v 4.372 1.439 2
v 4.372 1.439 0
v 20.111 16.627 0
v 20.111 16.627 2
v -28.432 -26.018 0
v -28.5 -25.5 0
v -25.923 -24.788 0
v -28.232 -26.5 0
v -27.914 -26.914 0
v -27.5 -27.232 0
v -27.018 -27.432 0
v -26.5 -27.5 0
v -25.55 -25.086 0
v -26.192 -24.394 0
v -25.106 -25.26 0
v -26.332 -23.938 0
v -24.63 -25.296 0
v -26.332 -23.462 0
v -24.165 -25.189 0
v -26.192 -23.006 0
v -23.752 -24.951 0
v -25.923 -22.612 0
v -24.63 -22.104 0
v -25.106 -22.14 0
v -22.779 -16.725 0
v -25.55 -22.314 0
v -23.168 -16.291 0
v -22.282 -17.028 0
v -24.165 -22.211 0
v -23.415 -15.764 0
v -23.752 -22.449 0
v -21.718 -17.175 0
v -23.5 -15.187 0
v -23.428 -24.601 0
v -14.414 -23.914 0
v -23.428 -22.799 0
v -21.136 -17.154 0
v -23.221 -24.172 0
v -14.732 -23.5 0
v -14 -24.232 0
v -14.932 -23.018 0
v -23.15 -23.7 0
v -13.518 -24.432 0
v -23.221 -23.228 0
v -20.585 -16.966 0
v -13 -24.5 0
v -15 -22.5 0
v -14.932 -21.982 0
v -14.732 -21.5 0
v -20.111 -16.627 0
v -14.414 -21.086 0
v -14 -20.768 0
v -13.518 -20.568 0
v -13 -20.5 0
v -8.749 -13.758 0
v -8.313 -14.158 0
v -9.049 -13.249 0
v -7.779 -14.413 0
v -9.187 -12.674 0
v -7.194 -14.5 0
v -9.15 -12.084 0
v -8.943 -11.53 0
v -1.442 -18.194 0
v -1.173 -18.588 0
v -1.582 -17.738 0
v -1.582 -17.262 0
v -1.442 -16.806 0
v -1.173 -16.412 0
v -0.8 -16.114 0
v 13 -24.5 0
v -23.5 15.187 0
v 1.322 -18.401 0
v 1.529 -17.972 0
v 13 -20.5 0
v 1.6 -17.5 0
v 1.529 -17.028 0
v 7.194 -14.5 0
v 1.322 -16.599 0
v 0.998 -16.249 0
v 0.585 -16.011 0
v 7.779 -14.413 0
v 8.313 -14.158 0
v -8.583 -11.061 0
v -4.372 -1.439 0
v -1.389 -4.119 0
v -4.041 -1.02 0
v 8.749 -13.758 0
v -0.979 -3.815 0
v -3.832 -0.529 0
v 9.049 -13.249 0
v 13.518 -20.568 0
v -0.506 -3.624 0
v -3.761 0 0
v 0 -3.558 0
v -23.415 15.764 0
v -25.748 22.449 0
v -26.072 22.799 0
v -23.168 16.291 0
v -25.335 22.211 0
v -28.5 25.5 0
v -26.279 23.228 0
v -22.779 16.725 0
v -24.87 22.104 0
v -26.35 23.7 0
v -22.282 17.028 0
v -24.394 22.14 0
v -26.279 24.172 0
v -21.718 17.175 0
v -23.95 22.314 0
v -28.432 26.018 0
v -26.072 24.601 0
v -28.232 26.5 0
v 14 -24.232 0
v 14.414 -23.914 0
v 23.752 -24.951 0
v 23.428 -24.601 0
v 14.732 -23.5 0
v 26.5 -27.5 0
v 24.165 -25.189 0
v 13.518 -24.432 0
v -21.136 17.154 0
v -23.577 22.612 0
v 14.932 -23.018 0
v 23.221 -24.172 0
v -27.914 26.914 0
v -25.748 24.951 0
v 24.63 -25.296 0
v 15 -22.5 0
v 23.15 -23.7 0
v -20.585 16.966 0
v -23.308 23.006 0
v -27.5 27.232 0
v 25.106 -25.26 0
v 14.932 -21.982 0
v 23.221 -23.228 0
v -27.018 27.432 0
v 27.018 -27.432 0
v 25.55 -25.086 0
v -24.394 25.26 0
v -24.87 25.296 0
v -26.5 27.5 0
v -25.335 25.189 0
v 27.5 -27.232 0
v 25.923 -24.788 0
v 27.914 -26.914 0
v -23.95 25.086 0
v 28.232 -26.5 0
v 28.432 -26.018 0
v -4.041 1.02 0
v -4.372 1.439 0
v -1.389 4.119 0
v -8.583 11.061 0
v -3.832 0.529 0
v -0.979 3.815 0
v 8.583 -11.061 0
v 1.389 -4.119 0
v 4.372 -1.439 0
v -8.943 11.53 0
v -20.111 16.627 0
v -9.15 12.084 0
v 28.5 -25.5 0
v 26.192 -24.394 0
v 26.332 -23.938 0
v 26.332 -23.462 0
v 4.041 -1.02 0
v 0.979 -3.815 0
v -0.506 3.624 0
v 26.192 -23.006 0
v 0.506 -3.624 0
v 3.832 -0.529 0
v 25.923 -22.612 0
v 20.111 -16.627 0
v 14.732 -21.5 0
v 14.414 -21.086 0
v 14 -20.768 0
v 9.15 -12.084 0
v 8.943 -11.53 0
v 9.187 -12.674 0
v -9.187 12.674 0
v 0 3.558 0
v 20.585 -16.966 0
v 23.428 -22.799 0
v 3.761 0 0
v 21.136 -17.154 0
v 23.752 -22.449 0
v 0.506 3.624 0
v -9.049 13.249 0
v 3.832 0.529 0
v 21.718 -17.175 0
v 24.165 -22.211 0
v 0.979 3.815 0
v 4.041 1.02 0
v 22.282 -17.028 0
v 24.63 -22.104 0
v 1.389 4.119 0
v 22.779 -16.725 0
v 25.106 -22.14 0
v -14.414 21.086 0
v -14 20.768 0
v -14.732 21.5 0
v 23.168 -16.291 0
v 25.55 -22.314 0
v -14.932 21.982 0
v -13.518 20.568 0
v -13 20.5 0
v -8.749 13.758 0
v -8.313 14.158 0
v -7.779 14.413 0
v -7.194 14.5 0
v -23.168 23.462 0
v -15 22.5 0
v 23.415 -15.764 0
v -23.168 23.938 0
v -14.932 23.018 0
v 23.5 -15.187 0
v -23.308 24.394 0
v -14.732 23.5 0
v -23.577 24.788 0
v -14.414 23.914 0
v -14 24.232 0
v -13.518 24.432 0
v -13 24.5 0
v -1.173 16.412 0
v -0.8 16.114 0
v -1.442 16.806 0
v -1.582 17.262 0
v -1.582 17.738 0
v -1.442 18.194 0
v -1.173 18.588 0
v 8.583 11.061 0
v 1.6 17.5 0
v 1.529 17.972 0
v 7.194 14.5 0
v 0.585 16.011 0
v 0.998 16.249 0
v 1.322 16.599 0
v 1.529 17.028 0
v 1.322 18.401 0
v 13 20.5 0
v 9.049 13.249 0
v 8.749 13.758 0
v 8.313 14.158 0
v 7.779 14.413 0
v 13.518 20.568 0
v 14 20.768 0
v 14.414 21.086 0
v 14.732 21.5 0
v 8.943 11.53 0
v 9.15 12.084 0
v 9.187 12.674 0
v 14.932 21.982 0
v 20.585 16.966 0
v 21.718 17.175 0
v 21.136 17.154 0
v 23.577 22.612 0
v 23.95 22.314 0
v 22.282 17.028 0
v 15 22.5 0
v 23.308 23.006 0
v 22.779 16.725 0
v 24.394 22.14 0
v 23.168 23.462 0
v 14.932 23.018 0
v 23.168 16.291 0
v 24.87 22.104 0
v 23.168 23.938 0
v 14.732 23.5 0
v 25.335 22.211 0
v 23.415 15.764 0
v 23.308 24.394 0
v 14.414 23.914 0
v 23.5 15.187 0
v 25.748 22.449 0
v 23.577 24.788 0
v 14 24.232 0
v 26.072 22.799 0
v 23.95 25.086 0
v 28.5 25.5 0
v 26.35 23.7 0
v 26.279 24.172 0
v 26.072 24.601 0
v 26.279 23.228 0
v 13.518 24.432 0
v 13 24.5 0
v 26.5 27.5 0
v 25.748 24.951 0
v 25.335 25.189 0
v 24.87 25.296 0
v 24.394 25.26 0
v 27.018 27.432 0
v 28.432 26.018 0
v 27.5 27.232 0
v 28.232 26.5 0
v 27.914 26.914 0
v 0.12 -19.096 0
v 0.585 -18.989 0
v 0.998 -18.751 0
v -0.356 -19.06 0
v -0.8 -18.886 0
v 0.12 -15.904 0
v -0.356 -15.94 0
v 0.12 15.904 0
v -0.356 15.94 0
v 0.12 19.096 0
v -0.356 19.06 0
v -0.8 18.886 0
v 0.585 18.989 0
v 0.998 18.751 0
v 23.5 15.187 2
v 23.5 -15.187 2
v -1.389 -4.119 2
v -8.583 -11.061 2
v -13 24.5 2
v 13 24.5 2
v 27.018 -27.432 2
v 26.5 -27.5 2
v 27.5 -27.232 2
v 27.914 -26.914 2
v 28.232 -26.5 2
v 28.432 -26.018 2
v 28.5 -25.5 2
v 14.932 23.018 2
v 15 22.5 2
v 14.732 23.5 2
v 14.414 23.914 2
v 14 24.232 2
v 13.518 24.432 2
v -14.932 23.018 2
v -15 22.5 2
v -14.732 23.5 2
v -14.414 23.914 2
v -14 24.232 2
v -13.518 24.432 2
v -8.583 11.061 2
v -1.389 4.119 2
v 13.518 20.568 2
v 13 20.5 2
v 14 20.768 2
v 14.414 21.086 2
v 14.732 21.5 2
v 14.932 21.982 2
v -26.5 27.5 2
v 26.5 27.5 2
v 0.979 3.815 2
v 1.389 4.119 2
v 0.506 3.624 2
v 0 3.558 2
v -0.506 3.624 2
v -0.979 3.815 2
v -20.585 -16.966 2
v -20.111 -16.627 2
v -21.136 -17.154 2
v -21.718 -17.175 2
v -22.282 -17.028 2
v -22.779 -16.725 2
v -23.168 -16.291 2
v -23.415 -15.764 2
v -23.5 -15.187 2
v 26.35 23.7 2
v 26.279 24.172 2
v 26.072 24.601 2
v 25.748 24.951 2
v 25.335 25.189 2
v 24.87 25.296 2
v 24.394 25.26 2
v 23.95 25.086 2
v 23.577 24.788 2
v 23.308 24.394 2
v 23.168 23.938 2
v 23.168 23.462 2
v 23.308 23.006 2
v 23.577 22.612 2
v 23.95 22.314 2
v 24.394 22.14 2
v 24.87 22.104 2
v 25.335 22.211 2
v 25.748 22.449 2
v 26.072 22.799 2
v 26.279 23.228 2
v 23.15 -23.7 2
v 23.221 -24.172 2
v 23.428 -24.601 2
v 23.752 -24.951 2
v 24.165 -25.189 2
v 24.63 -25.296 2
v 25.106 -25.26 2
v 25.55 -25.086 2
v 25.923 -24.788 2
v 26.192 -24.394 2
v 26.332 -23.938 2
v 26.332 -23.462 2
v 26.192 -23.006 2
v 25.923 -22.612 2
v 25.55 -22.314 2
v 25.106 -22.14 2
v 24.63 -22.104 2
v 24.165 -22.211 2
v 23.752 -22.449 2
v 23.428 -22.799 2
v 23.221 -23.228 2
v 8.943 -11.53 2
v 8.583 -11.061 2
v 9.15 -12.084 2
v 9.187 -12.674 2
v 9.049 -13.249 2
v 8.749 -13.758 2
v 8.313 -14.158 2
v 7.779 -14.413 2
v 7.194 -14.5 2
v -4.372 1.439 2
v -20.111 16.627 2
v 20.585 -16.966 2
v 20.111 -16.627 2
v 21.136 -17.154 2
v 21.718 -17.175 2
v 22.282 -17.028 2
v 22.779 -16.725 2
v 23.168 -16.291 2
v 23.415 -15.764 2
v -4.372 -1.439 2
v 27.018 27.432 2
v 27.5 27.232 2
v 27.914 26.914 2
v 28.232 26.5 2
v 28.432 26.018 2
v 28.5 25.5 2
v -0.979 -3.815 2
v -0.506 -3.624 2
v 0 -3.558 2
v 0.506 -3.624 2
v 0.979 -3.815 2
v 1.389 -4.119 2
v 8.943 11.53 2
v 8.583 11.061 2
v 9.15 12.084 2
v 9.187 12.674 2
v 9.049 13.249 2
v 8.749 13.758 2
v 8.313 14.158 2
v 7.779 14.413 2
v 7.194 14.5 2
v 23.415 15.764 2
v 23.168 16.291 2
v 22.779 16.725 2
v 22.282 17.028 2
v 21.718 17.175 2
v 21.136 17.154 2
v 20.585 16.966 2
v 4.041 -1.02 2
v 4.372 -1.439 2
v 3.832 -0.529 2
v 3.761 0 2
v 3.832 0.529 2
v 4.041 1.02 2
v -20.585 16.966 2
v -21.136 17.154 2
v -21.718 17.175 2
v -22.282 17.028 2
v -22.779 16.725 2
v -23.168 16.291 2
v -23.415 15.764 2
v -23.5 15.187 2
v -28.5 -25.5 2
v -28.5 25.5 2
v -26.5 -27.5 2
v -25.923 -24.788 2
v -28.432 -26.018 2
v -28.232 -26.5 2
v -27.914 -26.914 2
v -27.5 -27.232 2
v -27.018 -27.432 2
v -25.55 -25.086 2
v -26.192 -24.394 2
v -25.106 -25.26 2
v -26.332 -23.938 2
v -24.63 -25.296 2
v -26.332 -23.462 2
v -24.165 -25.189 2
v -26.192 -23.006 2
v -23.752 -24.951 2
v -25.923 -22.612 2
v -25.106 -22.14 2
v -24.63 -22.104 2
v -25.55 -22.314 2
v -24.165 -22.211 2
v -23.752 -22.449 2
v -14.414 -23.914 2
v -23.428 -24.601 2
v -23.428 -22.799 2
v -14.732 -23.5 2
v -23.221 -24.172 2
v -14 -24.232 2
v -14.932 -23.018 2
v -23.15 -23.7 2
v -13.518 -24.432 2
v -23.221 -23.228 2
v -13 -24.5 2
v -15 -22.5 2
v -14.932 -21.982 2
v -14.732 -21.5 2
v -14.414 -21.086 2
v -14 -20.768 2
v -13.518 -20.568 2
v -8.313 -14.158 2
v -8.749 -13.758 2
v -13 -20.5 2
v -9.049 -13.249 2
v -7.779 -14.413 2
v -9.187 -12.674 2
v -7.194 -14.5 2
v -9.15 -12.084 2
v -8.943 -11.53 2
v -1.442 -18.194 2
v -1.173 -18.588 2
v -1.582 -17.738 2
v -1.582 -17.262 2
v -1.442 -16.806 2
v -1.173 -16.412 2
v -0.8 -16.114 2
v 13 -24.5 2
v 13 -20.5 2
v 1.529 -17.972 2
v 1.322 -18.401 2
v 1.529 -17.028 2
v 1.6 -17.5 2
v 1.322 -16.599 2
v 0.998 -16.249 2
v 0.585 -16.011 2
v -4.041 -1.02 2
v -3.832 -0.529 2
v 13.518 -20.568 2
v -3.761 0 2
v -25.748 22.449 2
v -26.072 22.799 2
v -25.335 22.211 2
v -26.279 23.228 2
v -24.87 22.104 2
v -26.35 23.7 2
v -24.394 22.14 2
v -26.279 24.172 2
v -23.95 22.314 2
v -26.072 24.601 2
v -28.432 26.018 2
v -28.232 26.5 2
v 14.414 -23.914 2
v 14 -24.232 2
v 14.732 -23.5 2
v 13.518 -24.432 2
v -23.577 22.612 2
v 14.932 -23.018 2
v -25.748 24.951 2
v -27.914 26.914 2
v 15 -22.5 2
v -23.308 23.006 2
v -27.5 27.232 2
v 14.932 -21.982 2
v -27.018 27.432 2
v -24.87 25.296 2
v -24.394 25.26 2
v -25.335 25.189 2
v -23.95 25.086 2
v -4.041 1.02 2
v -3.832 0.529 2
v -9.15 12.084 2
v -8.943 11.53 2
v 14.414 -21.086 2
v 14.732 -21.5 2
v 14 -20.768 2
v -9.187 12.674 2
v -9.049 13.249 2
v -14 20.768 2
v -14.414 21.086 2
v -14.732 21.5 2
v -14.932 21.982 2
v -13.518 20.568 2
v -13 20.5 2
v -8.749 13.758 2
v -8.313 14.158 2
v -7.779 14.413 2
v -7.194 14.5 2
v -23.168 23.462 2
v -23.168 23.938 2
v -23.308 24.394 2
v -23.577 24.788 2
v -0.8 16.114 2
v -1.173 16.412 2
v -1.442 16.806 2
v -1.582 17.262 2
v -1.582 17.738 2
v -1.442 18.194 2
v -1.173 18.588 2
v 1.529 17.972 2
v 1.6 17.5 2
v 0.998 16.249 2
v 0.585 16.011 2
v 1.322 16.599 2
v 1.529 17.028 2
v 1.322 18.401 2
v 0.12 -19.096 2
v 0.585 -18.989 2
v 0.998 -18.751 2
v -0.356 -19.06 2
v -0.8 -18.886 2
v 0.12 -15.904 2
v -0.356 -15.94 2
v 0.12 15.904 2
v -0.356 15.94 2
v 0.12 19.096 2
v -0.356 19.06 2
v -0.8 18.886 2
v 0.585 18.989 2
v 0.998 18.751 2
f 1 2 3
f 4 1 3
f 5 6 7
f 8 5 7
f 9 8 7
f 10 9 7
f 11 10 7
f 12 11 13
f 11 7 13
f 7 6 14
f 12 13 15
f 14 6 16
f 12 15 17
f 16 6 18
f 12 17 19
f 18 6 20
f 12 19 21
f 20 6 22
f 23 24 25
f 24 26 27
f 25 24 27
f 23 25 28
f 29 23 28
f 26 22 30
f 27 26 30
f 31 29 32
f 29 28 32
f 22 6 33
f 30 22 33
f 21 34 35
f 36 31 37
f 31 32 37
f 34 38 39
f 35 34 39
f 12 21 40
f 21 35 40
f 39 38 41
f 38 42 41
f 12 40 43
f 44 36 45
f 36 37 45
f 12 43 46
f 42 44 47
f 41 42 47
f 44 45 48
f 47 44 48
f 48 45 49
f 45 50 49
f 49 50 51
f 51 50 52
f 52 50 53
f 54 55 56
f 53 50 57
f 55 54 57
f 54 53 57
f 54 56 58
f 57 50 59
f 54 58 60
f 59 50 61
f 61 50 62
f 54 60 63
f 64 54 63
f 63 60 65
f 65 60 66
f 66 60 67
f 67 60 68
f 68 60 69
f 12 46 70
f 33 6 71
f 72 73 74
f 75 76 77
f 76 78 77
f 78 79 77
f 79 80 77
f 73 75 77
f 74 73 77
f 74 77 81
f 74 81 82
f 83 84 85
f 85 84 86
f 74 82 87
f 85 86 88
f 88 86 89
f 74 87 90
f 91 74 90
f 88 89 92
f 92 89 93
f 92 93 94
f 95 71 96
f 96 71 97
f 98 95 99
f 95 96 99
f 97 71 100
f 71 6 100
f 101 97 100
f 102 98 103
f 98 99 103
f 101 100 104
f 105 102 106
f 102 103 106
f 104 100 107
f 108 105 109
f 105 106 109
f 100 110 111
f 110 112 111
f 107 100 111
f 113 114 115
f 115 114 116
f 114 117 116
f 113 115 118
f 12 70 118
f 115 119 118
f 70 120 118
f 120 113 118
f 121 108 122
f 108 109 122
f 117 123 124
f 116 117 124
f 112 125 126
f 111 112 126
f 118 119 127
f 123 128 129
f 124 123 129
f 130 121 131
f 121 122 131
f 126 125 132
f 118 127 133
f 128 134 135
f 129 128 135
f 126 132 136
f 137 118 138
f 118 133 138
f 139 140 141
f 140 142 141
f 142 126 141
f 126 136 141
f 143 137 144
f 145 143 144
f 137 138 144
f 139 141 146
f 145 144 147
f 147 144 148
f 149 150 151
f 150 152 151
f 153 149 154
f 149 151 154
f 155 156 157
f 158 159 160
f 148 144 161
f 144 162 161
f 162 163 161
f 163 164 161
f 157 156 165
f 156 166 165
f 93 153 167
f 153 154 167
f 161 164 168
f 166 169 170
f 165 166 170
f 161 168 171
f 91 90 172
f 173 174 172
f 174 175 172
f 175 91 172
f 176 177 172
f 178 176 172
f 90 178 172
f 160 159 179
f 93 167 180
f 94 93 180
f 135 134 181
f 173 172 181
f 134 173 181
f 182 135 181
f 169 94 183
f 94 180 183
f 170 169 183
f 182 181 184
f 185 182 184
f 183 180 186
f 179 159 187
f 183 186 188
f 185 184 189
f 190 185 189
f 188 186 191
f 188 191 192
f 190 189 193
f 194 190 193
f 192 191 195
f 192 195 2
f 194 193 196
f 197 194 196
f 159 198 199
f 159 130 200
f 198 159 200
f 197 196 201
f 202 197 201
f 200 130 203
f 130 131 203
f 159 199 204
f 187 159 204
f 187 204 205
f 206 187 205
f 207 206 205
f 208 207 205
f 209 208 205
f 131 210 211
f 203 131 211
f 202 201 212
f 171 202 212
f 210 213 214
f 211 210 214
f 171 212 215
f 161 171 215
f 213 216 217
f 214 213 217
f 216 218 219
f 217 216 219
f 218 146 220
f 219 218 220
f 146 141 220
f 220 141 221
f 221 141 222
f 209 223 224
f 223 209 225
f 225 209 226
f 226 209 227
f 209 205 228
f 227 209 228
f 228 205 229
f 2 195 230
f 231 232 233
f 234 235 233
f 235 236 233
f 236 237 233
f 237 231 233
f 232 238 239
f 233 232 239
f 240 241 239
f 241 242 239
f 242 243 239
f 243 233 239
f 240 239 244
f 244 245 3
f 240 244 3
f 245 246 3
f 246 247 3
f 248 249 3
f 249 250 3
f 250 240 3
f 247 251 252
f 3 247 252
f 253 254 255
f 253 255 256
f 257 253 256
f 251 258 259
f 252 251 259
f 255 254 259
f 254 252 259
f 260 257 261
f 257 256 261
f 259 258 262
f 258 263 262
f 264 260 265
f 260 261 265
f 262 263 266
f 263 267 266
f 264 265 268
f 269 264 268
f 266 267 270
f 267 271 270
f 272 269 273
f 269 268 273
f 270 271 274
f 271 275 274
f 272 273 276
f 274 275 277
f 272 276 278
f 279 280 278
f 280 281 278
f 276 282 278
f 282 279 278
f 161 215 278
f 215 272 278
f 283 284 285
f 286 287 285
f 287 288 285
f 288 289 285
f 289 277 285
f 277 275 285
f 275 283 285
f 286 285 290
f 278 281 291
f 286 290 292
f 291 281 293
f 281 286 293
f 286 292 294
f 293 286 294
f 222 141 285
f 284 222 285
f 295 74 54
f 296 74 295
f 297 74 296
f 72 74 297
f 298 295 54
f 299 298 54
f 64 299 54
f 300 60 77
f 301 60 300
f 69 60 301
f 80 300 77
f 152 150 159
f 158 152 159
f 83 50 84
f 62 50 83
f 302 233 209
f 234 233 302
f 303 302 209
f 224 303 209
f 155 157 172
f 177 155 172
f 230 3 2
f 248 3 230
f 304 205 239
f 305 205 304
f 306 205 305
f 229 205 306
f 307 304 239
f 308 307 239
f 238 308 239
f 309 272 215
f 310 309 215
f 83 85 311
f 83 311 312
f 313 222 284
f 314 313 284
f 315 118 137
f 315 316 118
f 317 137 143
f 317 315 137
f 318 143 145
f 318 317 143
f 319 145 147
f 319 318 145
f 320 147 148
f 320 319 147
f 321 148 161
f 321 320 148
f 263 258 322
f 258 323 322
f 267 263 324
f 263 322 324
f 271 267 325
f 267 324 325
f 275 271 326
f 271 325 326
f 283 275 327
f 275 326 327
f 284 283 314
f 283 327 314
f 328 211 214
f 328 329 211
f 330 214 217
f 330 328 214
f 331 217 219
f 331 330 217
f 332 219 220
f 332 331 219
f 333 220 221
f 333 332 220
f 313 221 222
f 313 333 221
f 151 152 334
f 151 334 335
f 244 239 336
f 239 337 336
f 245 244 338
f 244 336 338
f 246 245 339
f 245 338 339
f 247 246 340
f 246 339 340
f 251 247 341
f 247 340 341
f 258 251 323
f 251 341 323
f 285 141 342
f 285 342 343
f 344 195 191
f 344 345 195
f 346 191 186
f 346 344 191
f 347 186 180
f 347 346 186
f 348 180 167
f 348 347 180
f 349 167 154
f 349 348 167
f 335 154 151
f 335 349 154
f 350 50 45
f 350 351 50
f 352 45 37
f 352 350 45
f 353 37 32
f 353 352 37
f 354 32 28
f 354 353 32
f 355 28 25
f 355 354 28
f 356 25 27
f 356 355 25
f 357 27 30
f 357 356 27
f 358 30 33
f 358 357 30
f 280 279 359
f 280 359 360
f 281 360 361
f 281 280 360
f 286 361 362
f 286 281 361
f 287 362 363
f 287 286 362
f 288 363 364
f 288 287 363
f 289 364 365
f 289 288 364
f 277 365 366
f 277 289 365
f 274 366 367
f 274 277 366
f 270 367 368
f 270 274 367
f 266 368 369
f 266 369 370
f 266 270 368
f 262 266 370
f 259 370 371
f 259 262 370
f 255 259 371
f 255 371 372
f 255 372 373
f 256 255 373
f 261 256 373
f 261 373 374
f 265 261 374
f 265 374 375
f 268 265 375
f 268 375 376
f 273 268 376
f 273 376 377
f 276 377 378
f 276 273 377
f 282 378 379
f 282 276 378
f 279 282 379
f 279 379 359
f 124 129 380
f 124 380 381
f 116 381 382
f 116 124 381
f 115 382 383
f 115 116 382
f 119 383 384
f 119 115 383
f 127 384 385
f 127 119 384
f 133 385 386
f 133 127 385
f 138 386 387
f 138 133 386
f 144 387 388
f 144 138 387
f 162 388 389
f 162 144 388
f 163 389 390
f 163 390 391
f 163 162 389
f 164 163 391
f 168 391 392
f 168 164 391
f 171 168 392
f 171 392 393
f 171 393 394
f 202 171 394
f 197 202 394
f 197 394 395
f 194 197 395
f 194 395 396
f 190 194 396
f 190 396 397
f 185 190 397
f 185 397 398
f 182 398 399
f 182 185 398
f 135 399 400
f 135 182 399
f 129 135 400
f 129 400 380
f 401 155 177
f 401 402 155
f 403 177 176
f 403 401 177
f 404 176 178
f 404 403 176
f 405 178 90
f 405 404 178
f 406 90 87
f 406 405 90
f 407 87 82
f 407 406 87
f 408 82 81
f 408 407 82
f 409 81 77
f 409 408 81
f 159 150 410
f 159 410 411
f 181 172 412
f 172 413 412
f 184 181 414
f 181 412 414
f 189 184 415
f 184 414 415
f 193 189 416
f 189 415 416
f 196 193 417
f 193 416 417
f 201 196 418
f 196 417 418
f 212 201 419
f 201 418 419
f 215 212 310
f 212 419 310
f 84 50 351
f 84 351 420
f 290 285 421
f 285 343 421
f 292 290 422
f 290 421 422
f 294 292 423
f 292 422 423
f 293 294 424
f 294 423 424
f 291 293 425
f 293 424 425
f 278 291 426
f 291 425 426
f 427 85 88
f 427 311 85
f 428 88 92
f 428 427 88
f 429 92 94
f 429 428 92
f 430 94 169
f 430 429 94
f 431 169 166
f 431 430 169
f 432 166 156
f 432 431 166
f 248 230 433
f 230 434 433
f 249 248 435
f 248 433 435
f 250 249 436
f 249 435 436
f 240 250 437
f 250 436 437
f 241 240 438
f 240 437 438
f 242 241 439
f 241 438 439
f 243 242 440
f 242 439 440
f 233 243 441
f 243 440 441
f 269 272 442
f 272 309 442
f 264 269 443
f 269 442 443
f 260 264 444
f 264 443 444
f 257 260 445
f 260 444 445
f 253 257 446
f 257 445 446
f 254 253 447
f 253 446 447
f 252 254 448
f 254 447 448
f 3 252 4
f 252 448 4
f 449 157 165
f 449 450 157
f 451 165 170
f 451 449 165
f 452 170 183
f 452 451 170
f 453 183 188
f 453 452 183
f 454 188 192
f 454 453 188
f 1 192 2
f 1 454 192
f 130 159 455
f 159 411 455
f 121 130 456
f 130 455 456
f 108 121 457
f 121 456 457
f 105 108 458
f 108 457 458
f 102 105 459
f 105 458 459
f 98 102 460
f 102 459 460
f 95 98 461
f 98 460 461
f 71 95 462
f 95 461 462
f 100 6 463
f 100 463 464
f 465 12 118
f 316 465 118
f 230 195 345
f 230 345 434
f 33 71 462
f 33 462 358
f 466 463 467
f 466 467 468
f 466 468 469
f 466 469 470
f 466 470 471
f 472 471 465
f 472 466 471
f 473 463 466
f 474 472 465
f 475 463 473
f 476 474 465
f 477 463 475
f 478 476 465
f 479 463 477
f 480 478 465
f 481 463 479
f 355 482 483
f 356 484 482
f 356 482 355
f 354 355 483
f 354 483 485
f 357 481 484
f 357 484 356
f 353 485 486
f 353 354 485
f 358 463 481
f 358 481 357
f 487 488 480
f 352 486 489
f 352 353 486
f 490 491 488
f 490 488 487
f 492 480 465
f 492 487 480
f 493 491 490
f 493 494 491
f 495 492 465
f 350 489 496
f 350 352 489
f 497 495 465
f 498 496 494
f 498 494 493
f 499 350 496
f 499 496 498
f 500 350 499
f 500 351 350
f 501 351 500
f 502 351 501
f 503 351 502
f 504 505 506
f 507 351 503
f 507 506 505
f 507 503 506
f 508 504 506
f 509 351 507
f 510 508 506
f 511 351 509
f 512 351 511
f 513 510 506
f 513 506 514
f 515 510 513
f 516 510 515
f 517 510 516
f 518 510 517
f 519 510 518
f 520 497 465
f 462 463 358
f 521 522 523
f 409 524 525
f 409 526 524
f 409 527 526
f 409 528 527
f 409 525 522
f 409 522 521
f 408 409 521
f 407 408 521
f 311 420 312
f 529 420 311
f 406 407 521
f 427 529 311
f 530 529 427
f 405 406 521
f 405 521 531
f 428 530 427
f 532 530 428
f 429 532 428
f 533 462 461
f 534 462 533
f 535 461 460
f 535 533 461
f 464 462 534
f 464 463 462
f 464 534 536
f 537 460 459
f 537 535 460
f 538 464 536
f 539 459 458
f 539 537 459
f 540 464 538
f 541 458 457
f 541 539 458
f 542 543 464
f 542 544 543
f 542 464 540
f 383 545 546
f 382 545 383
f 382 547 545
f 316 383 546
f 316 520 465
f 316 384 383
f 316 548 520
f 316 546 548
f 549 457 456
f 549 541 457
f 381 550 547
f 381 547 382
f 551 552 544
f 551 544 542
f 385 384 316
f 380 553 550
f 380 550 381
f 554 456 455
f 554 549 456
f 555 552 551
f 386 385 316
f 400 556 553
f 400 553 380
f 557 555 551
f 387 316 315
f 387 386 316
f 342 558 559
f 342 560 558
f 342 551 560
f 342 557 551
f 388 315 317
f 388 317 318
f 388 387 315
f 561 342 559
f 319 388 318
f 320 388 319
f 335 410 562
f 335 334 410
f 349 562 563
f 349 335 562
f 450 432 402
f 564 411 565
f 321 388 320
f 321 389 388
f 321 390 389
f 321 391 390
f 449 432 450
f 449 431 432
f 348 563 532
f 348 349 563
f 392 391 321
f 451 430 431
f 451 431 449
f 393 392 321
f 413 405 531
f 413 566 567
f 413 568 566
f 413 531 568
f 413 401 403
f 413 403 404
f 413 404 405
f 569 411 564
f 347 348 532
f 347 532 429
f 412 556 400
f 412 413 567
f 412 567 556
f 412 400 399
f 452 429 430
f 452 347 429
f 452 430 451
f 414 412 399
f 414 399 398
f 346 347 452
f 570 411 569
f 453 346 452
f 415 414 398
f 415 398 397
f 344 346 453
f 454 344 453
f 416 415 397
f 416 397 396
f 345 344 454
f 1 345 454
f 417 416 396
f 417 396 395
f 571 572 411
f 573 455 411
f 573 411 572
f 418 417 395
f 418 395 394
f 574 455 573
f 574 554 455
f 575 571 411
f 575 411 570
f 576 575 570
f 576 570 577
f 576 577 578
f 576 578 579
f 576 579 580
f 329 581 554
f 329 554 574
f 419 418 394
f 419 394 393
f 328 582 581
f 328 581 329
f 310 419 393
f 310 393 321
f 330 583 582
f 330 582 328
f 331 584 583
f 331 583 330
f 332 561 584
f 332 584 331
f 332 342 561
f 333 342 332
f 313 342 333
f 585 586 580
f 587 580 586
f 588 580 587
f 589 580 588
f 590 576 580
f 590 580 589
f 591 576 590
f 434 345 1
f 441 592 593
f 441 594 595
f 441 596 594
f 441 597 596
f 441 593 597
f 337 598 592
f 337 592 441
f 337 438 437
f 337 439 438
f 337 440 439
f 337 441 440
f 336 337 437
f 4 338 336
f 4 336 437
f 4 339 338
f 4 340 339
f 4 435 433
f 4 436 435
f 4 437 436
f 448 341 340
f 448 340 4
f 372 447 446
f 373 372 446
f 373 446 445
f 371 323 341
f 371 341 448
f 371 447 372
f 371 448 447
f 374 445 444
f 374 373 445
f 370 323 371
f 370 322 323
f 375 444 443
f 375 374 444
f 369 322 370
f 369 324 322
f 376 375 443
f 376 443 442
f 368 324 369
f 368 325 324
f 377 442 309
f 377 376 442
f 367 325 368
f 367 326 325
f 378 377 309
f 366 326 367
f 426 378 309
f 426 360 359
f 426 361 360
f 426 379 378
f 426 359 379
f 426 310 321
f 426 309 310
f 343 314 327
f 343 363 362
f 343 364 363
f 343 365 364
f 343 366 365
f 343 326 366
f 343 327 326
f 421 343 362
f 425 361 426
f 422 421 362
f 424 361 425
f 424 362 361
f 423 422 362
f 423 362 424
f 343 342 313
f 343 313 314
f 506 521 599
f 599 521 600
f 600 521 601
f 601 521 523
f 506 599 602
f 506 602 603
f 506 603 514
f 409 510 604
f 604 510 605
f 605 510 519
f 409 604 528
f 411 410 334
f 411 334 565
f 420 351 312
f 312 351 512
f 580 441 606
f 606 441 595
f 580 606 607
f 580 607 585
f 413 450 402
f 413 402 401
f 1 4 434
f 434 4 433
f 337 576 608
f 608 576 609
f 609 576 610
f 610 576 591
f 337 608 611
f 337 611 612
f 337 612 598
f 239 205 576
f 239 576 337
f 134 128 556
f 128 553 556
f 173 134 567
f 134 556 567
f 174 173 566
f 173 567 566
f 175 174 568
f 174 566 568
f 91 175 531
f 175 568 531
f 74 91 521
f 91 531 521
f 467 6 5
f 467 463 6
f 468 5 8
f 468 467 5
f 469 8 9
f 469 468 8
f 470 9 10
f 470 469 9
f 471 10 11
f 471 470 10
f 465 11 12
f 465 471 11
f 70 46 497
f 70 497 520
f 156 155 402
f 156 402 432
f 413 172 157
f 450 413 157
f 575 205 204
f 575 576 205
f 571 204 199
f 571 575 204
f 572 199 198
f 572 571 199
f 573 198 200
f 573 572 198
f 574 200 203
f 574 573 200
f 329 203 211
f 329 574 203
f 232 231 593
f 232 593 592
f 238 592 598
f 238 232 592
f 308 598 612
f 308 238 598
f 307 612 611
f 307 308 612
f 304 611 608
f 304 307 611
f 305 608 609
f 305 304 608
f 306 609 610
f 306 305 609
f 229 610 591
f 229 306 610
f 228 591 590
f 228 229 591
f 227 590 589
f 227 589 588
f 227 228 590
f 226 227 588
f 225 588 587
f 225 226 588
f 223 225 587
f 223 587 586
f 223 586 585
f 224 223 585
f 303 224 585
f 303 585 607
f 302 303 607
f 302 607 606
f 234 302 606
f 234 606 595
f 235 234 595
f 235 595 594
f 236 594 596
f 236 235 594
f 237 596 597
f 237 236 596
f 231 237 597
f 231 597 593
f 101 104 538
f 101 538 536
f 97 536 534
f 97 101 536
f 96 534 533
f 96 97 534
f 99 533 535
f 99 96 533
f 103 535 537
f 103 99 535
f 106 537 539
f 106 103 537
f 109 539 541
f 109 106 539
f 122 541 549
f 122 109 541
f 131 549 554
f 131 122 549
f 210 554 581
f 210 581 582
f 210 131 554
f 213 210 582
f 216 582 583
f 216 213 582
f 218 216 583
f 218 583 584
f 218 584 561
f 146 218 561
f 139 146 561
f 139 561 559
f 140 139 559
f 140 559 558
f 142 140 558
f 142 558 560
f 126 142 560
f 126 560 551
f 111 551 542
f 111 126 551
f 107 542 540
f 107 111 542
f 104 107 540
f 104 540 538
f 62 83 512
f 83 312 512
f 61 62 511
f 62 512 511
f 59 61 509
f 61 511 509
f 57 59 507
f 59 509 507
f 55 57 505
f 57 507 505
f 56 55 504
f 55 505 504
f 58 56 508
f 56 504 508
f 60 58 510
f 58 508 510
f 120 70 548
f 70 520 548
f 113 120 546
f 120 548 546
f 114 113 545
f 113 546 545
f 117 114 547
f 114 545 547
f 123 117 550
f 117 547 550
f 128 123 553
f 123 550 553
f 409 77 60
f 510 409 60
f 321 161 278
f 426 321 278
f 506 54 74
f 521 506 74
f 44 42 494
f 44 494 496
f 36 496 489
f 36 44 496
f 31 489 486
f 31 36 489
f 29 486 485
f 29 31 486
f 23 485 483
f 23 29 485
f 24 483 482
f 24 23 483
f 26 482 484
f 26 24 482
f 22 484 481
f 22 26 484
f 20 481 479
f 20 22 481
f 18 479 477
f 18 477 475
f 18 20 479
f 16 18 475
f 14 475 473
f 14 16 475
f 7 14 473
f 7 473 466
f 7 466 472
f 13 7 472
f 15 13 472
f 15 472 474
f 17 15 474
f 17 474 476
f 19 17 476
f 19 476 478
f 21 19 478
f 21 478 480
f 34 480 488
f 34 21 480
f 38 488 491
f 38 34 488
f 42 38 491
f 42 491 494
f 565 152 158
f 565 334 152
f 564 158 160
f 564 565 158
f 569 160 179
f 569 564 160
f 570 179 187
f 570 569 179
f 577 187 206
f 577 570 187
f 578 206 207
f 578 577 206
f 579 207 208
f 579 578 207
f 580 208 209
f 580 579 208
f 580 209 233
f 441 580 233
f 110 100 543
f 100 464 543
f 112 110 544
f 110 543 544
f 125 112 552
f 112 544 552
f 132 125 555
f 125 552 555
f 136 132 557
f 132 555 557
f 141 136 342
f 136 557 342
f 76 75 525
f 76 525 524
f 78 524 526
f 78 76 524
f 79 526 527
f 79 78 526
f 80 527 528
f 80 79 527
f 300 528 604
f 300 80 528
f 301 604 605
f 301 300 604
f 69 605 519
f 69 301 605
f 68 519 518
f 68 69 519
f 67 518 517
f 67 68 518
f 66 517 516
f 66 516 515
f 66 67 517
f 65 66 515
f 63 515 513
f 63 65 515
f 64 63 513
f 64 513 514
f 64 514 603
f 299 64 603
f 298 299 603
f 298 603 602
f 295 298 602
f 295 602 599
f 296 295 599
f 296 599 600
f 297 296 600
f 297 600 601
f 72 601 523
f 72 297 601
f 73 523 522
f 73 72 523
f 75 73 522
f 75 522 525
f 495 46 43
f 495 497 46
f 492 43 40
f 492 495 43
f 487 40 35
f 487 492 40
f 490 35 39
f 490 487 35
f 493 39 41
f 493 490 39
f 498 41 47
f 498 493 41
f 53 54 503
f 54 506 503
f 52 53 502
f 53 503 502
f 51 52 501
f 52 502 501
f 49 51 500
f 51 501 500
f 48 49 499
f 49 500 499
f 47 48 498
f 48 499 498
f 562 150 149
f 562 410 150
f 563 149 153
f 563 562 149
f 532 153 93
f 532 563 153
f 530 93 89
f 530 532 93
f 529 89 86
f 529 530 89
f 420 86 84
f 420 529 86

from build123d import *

# Parameters (mm, degrees)
SKETCH_1_W      = 57
SKETCH_1_H      = 55
SKETCH_1_R      = 1.6
SKETCH_1_W_2    = 30
SKETCH_1_H_2    = 4
EXTRUDE_1_DEPTH = 2
FILLET_1_R      = 2


with BuildPart() as part:
    # 草图1 → 凸台-拉伸1 (new body)
    with BuildSketch(Plane.XY):
        Rectangle(SKETCH_1_W, SKETCH_1_H)
        with Locations((24.75, 23.7)):
            Circle(SKETCH_1_R, mode=Mode.SUBTRACT)
        with Locations(Location((-24.75, 23.7, 0), (0, 0, 180))):
            Circle(SKETCH_1_R, mode=Mode.SUBTRACT)
        with Locations(Location((24.75, -23.7, 0), (0, 0, 180))):
            Circle(SKETCH_1_R, mode=Mode.SUBTRACT)
        with Locations((-24.75, -23.7)):
            Circle(SKETCH_1_R, mode=Mode.SUBTRACT)
        with Locations((0, 17.5)):
            Circle(SKETCH_1_R, mode=Mode.SUBTRACT)
        with Locations((0, -17.5)):
            Circle(SKETCH_1_R, mode=Mode.SUBTRACT)
        Polygon((-2.880312196, 0), (-23.5, 19.896189986), (-23.5, -19.896189986), align=None, mode=Mode.SUBTRACT)
        Polygon((0, -2.77924861), (-12.146960531, -14.5), (0, -14.5), (12.146960531, -14.5), align=None, mode=Mode.SUBTRACT)
        with Locations((0, 22.5)):
            Rectangle(SKETCH_1_W_2, SKETCH_1_H_2, mode=Mode.SUBTRACT)
        Polygon((2.880312196, 0), (23.5, 19.896189986), (23.5, -19.896189986), align=None, mode=Mode.SUBTRACT)
        Polygon((0, 2.77924861), (12.146960531, 14.5), (0, 14.5), (-12.146960531, 14.5), align=None, mode=Mode.SUBTRACT)
        with Locations((0, -22.5)):
            Rectangle(SKETCH_1_W_2, SKETCH_1_H_2, mode=Mode.SUBTRACT)
    extrude(amount=EXTRUDE_1_DEPTH)

    # 圆角1
    fillet_1_edges = [part.edges().sort_by_distance(p)[0] for p in [
        (23.5, 19.896189986, 1),
        (2.880312196, 0, 1),
        (23.5, -19.896189986, 1),
        (-15, 24.5, 1),
        (-15, 20.5, 1),
        (15, 20.5, 1),
        (15, 24.5, 1),
        (12.146960531, -14.5, 1),
        (0, -2.77924861, 1),
        (-23.5, 19.896189986, 1),
        (-23.5, -19.896189986, 1),
        (-2.880312196, 0, 1),
        (-12.146960531, -14.5, 1),
        (-28.5, -27.5, 1),
        (-28.5, 27.5, 1),
        (28.5, 27.5, 1),
        (28.5, -27.5, 1),
        (12.146960531, 14.5, 1),
        (0, 2.77924861, 1),
        (-12.146960531, 14.5, 1),
        (15, -24.5, 1),
        (15, -20.5, 1),
        (-15, -24.5, 1),
        (-15, -20.5, 1),
    ]]
    fillet(fillet_1_edges, radius=FILLET_1_R - 0.0001)  # a hair under: the kernel refuses the full size


solid = part.part
